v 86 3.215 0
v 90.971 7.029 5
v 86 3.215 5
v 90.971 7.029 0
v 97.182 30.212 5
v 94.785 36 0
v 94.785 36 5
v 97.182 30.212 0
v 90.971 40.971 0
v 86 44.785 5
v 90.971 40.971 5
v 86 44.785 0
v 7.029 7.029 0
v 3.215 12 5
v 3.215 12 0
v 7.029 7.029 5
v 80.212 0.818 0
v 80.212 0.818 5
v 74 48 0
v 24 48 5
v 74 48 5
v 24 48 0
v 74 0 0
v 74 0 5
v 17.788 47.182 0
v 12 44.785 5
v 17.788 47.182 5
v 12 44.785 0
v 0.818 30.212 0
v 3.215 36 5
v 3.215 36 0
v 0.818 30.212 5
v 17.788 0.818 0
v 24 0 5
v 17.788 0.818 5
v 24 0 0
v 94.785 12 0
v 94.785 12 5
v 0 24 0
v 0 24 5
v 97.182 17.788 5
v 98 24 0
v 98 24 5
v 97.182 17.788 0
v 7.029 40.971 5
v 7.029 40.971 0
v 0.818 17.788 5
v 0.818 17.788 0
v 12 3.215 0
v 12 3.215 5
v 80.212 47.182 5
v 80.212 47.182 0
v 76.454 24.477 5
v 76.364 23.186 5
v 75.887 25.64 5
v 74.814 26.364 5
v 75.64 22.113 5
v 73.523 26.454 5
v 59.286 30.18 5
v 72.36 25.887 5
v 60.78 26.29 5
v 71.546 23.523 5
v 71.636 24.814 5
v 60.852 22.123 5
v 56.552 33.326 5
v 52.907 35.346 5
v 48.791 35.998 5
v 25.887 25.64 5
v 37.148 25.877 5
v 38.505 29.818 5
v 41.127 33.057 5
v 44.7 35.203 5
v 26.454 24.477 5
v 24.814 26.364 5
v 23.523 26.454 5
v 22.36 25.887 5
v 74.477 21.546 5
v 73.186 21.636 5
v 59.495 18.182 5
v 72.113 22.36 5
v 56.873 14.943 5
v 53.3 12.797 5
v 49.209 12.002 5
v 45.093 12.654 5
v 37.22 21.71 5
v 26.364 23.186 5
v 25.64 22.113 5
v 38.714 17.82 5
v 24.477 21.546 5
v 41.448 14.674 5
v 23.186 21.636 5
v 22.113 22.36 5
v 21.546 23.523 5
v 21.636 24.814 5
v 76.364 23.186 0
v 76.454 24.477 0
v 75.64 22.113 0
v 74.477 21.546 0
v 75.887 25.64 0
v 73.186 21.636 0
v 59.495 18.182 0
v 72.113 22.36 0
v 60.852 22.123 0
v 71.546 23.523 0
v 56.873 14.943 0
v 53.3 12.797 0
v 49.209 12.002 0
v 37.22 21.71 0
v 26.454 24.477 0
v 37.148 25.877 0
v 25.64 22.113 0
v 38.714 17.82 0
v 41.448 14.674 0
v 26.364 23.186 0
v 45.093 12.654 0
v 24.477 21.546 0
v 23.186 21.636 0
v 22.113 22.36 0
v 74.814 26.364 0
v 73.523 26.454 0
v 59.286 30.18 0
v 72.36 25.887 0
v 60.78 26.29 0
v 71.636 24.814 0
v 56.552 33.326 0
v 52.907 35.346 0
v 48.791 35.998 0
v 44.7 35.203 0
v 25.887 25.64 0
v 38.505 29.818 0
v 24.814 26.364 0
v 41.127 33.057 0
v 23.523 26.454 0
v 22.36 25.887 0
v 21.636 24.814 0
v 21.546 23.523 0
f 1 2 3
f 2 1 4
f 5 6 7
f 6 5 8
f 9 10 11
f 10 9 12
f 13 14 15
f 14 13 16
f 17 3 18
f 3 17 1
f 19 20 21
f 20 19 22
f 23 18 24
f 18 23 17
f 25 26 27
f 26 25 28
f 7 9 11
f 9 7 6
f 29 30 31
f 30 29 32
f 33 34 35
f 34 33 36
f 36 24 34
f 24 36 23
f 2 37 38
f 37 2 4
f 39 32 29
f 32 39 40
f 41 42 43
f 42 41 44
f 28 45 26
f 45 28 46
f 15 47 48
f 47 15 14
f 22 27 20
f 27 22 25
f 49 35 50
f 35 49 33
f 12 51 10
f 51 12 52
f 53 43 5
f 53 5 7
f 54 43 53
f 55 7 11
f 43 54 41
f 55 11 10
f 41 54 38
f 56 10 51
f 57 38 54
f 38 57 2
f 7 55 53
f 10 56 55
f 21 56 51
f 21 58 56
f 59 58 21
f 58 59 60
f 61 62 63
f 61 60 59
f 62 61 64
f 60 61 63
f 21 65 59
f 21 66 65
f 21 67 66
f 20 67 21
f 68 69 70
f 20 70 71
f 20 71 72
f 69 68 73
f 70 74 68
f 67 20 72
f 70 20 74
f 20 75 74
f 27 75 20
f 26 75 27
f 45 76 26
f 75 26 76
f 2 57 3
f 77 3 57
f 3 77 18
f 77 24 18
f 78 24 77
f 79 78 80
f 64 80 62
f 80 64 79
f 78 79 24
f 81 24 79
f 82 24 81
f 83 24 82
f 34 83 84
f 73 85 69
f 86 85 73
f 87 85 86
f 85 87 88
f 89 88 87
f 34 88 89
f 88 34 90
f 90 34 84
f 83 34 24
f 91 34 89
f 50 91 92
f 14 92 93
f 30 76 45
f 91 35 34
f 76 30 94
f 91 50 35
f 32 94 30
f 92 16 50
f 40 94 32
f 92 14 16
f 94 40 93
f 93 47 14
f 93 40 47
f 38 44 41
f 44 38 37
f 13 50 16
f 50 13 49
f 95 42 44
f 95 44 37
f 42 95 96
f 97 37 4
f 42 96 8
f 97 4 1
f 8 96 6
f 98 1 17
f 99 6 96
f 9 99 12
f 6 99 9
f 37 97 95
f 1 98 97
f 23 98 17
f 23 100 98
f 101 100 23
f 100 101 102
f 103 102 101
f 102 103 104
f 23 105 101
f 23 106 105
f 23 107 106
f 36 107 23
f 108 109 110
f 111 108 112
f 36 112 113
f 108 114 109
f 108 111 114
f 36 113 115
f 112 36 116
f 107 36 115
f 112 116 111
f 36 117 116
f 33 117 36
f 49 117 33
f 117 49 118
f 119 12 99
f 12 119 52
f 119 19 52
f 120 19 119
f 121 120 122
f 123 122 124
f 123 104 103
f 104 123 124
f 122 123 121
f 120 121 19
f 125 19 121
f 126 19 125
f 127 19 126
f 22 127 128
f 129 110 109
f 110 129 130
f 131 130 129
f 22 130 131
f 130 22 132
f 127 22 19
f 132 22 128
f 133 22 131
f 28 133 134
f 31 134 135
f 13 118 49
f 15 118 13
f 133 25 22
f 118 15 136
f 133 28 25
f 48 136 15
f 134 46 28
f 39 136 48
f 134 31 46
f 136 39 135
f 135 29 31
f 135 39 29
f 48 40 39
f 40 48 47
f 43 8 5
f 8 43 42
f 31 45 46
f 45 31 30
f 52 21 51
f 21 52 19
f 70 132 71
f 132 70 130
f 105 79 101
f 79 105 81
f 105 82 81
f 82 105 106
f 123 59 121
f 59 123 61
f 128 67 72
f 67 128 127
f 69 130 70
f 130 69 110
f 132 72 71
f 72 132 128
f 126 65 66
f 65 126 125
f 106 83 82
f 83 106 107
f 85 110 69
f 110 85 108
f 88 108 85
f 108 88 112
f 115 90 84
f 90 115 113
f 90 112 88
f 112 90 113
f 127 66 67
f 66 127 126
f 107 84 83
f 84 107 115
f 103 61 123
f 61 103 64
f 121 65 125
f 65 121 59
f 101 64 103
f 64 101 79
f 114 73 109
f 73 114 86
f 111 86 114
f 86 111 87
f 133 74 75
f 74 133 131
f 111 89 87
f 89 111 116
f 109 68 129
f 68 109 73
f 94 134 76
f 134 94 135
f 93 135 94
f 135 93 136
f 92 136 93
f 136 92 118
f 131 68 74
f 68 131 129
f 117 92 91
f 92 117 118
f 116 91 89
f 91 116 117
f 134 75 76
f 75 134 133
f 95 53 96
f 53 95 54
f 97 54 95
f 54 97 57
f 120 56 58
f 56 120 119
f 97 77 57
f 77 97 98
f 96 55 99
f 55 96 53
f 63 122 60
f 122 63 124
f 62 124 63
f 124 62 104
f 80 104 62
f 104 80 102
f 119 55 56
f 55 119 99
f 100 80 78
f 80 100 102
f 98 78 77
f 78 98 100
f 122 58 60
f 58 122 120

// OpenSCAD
$fn = 32;

// ----------------------------------------------------------------------
// Spacer plate: obround span 50, caps R24
// ----------------------------------------------------------------------

// --- parameters (mm) ---
bore_r = 12;              // centre bore radius
bolt_r = 2.5;             // bolt hole radius
plate_t = 5;              // plate thickness, Z (extrusion height)
span = 50;                // obround span
cap_r = 24;               // cap radius

profile = [[24, 48], [17.788, 47.182], [12, 44.785], [7.029, 40.971], [3.215, 36], [0.818, 30.212], [0, 24], [0.818, 17.788], [3.215, 12], [7.029, 7.029], [12, 3.215], [17.788, 0.818], [24, 0], [74, 0], [80.212, 0.818], [86, 3.215], [90.971, 7.029], [94.785, 12], [97.182, 17.788], [98, 24], [97.182, 30.212], [94.785, 36], [90.971, 40.971], [86, 44.785], [80.212, 47.182], [74, 48]];  // primary outline, 26 points, counter clockwise
void_1 = [[60.78, 26.29], [59.286, 30.18], [56.552, 33.326], [52.907, 35.346], [48.791, 35.998], [44.7, 35.203], [41.127, 33.057], [38.505, 29.818], [37.148, 25.877], [37.22, 21.71], [38.714, 17.82], [41.448, 14.674], [45.093, 12.654], [49.209, 12.002], [53.3, 12.797], [56.873, 14.943], [59.495, 18.182], [60.852, 22.123]];  // centre bore, 18 points
void_2 = [[26.454, 24.477], [25.887, 25.64], [24.814, 26.364], [23.523, 26.454], [22.36, 25.887], [21.636, 24.814], [21.546, 23.523], [22.113, 22.36], [23.186, 21.636], [24.477, 21.546], [25.64, 22.113], [26.364, 23.186]];  // end hole, 12 points
void_3 = [[76.454, 24.477], [75.887, 25.64], [74.814, 26.364], [73.523, 26.454], [72.36, 25.887], [71.636, 24.814], [71.546, 23.523], [72.113, 22.36], [73.186, 21.636], [74.477, 21.546], [75.64, 22.113], [76.364, 23.186]];  // end hole, 12 points

// --- the one profile operation ---
difference() {
  linear_extrude(height = plate_t) polygon(points = profile);
  translate([0, 0, -1])
    linear_extrude(height = plate_t + 2) polygon(points = void_1);
  translate([0, 0, -1])
    linear_extrude(height = plate_t + 2) polygon(points = void_2);
  translate([0, 0, -1])
    linear_extrude(height = plate_t + 2) polygon(points = void_3);
}
